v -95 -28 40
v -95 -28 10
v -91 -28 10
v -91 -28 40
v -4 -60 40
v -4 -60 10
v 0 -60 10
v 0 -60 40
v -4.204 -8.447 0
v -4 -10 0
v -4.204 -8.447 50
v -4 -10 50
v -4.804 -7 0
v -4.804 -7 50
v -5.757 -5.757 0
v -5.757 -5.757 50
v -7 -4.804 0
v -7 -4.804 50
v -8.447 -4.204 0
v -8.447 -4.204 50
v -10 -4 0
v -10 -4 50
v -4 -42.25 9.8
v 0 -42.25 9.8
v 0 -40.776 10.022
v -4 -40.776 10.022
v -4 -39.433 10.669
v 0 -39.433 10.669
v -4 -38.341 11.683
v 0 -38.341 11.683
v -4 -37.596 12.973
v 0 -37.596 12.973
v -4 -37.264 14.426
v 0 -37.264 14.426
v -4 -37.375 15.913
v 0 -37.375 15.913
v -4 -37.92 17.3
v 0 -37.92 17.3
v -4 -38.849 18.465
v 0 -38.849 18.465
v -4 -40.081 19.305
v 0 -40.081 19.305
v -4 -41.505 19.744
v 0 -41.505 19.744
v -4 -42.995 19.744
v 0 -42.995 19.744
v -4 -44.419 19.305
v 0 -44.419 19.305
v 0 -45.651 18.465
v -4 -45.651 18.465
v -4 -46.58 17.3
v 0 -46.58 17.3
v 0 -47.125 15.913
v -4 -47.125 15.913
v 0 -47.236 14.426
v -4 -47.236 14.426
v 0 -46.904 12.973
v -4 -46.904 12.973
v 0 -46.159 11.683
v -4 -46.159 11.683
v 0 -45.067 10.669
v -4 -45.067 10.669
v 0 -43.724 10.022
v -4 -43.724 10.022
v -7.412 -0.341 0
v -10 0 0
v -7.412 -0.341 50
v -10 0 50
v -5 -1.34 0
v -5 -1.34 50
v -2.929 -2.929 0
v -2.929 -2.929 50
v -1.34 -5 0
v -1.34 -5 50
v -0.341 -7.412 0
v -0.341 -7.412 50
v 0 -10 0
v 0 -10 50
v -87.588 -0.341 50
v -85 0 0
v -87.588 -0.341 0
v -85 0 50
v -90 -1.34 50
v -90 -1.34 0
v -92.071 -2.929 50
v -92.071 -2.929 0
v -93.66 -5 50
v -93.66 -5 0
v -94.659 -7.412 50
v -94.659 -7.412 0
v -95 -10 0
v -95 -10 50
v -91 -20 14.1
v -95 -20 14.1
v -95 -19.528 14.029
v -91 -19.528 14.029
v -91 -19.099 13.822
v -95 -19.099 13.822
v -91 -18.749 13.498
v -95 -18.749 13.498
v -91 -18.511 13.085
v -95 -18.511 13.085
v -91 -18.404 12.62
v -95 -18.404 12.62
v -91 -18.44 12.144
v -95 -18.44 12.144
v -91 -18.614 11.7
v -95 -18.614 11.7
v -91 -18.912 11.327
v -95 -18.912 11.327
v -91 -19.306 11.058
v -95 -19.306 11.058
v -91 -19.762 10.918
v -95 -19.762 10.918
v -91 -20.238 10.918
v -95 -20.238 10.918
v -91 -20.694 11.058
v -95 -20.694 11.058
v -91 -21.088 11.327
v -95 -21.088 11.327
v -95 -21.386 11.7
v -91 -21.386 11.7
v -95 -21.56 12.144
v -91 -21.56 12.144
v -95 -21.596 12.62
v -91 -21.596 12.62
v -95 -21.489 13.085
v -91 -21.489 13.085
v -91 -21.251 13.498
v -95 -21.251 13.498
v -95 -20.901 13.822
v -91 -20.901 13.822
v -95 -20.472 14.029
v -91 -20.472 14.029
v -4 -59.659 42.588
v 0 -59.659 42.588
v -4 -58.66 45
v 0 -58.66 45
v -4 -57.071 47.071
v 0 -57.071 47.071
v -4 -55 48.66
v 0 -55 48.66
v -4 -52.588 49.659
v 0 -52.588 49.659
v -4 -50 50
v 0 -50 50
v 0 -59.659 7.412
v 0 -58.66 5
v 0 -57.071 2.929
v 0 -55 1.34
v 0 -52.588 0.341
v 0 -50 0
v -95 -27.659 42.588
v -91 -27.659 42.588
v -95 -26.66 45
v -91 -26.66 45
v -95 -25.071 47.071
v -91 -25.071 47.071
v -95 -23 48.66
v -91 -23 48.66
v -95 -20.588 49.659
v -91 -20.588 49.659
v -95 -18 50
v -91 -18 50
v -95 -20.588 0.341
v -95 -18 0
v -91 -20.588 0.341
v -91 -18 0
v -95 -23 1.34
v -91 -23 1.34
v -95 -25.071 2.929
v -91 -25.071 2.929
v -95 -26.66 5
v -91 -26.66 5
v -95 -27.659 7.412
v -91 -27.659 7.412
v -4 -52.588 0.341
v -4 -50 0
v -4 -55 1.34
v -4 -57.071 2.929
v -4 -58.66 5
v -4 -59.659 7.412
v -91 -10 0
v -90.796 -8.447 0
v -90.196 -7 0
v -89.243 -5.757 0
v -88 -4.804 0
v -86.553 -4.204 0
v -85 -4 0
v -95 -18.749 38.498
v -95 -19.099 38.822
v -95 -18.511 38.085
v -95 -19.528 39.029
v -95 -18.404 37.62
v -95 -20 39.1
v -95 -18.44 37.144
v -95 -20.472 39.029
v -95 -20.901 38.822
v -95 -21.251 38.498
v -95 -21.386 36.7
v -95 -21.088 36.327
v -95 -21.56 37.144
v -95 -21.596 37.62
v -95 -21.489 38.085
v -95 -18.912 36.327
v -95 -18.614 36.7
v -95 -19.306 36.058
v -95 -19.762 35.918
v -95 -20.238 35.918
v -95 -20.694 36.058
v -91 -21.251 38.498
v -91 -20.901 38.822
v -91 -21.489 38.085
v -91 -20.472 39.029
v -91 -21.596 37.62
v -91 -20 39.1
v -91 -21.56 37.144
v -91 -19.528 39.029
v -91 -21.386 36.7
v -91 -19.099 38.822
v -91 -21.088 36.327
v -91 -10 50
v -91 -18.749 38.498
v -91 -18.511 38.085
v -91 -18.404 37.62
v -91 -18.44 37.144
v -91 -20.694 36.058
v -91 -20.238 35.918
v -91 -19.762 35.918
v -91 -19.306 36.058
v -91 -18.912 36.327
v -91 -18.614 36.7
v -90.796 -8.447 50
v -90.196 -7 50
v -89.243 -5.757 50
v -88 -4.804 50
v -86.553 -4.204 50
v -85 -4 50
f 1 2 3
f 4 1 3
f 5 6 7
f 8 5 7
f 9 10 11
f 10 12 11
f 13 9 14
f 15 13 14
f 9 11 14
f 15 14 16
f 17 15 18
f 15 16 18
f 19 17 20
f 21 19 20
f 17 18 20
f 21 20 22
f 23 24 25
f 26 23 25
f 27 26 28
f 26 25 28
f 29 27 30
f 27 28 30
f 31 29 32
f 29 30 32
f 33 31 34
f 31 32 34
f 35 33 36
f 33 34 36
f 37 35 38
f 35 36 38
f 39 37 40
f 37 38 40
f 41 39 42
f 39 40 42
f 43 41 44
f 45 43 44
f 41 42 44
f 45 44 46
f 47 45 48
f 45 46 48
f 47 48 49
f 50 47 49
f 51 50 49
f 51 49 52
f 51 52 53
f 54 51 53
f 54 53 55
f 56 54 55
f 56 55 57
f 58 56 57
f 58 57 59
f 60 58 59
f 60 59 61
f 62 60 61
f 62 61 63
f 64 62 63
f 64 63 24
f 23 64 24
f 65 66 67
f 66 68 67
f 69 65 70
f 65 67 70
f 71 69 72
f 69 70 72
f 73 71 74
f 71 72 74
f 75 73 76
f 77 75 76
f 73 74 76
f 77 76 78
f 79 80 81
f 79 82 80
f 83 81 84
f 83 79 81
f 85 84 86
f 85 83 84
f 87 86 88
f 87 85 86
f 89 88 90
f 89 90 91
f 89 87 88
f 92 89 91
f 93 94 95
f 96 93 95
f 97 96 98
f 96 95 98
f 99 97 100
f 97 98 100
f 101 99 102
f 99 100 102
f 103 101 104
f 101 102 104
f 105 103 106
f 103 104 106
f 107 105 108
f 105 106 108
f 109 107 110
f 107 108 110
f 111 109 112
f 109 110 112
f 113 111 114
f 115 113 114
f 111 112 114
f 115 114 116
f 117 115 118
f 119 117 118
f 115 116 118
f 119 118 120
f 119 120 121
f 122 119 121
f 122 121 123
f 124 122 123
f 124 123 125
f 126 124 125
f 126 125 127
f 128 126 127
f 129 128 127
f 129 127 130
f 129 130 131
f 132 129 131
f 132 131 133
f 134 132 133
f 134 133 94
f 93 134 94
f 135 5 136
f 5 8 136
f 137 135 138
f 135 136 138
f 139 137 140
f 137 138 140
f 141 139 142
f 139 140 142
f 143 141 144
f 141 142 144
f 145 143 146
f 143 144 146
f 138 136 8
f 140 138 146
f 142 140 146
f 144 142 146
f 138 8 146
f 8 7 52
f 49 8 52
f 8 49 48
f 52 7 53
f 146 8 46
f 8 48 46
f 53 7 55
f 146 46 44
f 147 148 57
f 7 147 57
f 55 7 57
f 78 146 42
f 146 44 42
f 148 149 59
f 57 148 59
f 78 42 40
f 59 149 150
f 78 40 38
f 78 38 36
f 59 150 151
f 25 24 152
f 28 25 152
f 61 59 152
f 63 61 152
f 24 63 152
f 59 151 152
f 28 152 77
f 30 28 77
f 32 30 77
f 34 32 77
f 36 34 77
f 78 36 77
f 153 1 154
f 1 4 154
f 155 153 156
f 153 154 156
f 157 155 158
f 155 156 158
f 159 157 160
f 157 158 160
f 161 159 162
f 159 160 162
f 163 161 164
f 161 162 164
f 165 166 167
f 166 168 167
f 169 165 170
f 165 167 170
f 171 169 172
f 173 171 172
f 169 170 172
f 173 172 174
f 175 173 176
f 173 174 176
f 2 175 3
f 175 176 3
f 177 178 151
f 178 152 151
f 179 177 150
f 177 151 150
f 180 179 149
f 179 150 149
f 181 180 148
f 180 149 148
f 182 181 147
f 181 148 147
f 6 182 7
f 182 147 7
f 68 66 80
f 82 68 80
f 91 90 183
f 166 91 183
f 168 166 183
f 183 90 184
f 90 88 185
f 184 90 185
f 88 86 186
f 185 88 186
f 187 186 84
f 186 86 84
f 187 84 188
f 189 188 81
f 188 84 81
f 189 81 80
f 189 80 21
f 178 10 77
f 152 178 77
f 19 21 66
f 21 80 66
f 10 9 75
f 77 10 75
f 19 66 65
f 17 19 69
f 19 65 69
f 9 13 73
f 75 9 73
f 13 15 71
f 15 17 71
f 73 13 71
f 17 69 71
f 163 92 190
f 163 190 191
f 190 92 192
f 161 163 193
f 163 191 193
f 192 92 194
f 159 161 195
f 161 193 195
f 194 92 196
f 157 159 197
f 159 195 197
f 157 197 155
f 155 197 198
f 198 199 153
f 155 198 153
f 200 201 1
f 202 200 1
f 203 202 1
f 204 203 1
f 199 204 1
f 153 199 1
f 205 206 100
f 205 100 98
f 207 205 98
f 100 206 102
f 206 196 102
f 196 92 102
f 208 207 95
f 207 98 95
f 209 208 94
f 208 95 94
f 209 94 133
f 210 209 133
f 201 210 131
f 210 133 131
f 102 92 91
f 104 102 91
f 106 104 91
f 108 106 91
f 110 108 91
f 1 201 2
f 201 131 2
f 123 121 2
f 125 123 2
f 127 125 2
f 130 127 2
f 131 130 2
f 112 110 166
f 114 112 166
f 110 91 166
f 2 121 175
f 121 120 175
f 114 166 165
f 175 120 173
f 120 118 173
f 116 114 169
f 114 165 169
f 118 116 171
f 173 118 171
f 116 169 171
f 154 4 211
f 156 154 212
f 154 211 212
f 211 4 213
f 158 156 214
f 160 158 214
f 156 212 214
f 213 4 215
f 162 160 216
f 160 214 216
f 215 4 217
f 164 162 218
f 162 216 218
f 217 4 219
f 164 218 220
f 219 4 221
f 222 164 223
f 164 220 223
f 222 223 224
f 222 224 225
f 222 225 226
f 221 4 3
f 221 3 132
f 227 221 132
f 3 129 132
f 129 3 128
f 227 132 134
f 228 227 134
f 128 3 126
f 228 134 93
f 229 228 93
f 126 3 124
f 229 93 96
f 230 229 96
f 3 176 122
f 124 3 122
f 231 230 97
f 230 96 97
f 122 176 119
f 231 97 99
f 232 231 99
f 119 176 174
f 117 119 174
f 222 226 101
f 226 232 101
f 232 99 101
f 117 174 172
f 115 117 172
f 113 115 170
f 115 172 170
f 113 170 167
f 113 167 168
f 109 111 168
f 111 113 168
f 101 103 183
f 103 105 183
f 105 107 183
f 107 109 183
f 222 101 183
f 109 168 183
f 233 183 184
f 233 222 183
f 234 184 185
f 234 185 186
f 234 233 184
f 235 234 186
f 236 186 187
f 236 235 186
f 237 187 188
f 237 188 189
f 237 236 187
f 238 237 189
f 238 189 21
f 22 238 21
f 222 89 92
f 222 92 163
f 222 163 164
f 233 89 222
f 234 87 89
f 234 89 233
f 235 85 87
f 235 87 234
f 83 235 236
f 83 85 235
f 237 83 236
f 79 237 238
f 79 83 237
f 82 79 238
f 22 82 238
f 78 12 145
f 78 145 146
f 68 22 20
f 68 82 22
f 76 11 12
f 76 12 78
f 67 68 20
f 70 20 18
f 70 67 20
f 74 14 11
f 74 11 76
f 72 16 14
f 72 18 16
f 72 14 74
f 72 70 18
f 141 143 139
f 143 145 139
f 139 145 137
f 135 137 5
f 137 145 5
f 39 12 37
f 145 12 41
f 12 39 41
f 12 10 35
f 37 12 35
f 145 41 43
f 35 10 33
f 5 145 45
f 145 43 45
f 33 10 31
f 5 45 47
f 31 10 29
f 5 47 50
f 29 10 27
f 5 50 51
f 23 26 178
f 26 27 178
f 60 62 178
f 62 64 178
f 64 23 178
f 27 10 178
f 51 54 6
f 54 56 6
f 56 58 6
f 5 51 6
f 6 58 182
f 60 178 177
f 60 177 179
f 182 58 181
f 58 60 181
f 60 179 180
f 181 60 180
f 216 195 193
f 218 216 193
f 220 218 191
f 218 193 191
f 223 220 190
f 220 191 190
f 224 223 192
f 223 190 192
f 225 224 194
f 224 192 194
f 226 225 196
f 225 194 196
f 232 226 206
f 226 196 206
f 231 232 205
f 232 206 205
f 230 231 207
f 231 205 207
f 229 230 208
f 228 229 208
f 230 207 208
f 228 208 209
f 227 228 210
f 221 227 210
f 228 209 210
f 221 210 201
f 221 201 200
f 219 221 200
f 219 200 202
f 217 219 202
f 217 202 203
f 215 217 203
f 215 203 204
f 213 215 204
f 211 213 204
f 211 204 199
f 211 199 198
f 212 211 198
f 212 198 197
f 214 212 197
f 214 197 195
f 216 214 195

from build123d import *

# Parameters (mm, degrees)
BOSS_EXTRUDE1_DEPTH = 50
SKETCH3_R           = 1.6
CUT_EXTRUDE1_DEPTH  = 50
SKETCH4_R           = 5
CUT_EXTRUDE2_DEPTH  = 50
FILLET1_R           = 10
FILLET2_R           = 6
FILLET3_R           = 10


with BuildPart() as part:
    # Sketch2 → Boss-Extrude1 (new body)
    with BuildSketch(Plane.XY):
        Polygon((0, 0), (-95, 0), (-95, -28), (-91, -28), (-91, -4), (-4, -4), (-4, -60), (0, -60), align=None)
    extrude(amount=BOSS_EXTRUDE1_DEPTH)

    # Sketch3 → Cut-Extrude1 (cut)
    with BuildSketch(Plane.ZY.offset(95)):
        with Locations((12.5, -20)):
            Circle(SKETCH3_R)
        with Locations((37.5, -20)):
            Circle(SKETCH3_R)
    extrude(amount=-CUT_EXTRUDE1_DEPTH, mode=Mode.SUBTRACT)

    # Sketch4 → Cut-Extrude2 (cut)
    with BuildSketch(Plane(origin=(0, 0, 0), x_dir=(0, 0, -1), z_dir=(1, 0, 0))):
        with Locations((-14.8, -42.25)):
            Circle(SKETCH4_R)
    extrude(amount=-CUT_EXTRUDE2_DEPTH, mode=Mode.SUBTRACT)

    # Fillet1
    fillet1_edges = [part.edges().sort_by_distance(p)[0] for p in [
        (-95, 0, 25),
        (0, 0, 25),
    ]]
    fillet(fillet1_edges, radius=FILLET1_R)

    # Fillet2
    fillet2_edges = [part.edges().sort_by_distance(p)[0] for p in [
        (-4, -4, 25),
        (-91, -4, 25),
    ]]
    fillet(fillet2_edges, radius=FILLET2_R)

    # Fillet3
    fillet3_edges = [part.edges().sort_by_distance(p)[0] for p in [
        (-93, -28, 0),
        (-93, -28, 50),
        (-2, -60, 50),
        (-2, -60, 0),
    ]]
    fillet(fillet3_edges, radius=FILLET3_R)


solid = part.part
